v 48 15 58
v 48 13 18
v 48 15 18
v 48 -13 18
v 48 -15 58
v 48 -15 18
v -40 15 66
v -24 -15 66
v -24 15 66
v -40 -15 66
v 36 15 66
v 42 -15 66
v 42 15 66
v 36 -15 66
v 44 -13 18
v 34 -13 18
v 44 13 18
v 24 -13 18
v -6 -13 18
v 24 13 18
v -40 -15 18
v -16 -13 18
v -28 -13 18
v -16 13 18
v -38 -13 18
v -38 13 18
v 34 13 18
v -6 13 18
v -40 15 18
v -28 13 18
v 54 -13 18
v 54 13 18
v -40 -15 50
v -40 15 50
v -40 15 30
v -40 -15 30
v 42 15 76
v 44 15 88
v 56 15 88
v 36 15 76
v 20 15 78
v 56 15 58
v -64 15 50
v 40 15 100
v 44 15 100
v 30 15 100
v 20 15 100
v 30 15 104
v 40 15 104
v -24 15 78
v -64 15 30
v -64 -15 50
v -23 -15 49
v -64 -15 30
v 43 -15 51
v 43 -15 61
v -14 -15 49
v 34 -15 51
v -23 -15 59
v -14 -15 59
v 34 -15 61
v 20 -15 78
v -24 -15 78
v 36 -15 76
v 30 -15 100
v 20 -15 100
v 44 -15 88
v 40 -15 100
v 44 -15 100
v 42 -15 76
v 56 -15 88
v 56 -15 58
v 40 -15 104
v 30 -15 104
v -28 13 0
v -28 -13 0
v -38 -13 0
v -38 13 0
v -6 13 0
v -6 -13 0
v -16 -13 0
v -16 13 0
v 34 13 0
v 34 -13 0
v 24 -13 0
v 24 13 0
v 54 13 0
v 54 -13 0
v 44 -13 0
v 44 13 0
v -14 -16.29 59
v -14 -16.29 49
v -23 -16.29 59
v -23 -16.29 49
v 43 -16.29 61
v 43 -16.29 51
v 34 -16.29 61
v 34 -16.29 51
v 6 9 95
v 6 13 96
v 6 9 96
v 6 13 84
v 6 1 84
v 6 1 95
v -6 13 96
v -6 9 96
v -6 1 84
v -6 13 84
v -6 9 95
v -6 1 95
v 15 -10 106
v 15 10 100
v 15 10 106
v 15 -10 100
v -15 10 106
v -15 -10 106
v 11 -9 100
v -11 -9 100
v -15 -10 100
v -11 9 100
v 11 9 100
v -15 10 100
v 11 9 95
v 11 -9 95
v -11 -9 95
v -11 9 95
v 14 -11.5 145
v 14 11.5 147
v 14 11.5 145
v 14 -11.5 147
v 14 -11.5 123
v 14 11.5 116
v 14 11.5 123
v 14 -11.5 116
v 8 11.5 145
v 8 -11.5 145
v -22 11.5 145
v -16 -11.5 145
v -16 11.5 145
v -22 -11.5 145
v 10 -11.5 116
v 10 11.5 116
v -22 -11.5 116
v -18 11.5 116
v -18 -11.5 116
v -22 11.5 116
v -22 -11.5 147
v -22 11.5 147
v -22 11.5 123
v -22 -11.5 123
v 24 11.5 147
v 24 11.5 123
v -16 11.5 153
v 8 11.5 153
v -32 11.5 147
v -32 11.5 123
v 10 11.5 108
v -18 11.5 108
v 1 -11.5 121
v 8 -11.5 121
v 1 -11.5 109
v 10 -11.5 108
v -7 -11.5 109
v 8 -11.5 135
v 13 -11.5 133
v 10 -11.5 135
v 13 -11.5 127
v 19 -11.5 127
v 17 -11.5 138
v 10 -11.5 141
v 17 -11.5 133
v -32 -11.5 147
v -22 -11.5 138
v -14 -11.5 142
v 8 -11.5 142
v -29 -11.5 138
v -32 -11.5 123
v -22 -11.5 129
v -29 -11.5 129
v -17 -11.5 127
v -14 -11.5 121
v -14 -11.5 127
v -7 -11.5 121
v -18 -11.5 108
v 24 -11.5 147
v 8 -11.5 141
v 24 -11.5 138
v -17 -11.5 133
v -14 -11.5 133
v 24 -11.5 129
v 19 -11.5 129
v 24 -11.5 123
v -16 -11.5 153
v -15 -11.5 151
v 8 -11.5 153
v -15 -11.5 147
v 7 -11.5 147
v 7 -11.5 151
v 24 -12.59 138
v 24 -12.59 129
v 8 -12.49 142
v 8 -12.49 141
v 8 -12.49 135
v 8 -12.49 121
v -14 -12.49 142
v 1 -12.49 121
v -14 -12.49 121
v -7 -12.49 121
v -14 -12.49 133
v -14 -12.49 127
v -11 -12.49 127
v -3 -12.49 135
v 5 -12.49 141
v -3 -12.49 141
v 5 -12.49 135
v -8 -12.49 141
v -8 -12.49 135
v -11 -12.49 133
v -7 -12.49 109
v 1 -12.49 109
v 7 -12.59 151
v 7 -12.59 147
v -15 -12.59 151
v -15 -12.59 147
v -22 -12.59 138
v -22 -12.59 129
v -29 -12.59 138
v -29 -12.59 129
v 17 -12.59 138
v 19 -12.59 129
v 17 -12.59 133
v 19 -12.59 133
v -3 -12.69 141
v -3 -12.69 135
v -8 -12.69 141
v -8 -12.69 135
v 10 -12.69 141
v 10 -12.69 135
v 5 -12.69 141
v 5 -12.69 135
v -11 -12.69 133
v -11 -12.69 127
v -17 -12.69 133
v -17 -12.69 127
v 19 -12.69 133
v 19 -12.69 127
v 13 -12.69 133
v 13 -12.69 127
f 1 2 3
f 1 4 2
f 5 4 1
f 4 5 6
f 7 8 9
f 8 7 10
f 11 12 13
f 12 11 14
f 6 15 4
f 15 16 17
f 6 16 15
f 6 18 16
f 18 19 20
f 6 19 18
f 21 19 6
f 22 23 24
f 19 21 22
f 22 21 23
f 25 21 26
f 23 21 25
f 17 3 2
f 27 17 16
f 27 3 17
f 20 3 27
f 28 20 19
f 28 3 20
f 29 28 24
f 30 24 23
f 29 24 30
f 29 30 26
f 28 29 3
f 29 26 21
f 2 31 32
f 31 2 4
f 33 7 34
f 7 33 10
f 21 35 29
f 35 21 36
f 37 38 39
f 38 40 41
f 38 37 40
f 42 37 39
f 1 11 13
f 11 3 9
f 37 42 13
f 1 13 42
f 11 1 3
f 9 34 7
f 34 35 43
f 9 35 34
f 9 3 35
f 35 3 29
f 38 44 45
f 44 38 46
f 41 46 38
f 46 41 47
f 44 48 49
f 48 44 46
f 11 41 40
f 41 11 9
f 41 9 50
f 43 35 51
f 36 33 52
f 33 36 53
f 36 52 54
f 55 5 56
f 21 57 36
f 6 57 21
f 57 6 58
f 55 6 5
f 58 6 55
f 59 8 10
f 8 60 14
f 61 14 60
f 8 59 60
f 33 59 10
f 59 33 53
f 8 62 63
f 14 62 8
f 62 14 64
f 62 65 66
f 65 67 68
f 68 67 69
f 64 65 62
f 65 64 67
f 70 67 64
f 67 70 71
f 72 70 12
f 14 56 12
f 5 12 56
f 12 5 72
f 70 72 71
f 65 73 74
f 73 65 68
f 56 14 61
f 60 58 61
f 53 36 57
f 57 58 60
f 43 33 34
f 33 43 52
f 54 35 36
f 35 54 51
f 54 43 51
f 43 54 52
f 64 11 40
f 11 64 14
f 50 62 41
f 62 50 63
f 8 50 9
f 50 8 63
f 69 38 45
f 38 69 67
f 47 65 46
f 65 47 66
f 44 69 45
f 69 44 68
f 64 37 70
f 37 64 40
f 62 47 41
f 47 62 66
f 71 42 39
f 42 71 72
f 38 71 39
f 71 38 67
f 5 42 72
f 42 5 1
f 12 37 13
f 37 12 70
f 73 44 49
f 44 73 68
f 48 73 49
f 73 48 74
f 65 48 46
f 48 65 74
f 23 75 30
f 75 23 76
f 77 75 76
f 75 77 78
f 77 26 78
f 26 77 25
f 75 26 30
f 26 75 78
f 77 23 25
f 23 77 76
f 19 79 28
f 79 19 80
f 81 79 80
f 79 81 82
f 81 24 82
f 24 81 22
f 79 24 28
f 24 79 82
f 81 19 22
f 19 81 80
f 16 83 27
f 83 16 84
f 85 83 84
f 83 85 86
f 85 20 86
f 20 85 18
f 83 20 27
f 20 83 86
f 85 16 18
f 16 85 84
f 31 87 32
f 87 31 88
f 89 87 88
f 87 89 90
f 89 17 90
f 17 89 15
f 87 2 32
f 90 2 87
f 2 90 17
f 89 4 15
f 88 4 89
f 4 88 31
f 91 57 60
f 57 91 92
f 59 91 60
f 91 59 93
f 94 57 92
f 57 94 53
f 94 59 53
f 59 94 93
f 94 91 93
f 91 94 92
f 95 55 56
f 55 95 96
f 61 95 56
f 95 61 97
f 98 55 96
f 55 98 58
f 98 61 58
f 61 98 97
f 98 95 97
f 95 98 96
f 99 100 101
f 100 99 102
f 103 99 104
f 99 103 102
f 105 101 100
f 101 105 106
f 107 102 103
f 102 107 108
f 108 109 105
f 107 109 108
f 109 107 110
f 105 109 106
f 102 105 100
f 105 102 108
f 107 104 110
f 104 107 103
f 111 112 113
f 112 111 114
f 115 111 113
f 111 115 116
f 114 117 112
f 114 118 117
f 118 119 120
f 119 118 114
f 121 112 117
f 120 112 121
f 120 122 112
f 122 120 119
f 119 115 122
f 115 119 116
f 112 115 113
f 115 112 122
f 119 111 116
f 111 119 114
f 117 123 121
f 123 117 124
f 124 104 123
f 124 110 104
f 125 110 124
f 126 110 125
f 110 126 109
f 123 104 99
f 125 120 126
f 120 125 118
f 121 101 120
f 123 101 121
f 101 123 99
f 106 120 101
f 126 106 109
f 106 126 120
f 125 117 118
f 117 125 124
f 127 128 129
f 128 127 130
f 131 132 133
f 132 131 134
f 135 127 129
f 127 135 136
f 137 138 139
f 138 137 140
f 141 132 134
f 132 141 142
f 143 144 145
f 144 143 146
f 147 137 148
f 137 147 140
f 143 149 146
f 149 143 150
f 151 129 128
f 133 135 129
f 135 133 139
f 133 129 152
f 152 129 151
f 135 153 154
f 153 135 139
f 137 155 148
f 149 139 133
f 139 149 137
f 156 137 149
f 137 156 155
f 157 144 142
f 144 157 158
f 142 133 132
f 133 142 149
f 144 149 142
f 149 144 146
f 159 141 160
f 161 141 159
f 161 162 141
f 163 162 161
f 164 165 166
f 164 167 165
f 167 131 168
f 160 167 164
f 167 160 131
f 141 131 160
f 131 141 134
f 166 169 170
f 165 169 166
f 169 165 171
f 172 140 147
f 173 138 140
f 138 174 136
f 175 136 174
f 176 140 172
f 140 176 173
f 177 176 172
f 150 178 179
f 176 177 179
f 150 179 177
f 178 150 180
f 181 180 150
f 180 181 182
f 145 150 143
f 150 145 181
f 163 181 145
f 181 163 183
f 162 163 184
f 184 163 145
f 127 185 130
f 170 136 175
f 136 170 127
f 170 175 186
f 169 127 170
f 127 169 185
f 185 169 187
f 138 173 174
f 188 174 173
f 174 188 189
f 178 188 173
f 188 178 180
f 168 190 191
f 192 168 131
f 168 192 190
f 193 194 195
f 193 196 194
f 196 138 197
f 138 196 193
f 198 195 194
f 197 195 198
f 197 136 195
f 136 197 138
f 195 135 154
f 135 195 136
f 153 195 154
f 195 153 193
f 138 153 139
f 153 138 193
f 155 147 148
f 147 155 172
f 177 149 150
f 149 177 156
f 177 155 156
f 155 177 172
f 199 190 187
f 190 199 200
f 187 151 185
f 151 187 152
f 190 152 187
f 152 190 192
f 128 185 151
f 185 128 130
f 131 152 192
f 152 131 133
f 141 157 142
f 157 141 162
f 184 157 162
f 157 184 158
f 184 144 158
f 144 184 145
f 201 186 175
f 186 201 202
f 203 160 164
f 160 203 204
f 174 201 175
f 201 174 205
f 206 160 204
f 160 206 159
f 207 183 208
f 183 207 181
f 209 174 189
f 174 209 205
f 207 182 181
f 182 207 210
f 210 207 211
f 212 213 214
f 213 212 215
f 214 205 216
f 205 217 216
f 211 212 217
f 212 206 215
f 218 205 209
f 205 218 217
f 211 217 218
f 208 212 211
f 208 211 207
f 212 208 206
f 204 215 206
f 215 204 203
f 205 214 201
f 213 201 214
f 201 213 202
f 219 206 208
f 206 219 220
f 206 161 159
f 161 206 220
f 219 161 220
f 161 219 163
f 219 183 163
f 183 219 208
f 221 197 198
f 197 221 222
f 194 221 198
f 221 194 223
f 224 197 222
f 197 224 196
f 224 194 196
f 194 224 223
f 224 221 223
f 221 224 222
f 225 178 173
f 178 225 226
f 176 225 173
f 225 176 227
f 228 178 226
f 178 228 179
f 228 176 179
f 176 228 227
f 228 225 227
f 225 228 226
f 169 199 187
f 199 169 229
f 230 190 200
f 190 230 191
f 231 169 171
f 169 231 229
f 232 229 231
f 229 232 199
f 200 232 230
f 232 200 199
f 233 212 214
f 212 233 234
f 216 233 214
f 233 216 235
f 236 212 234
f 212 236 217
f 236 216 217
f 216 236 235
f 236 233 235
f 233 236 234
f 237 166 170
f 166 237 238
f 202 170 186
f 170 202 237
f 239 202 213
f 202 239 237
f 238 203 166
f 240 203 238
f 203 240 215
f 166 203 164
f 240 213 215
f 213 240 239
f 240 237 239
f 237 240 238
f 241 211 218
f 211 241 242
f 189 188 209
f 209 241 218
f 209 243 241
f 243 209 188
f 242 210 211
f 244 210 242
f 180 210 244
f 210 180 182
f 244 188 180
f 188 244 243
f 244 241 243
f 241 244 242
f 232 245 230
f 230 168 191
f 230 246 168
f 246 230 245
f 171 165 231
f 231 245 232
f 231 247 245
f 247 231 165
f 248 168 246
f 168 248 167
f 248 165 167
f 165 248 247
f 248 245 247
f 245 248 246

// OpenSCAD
// Lightbulb Marker - Version 006
// Chunky 3D voxel model; the reference's white sticker outline is not geometry.
// Changes from previous version:
// - Widened/lowered the orange creature body for a closer front silhouette.
// - Enlarged the left protruding block and cleaned up the right-side step.
// - Moved the black square eyes higher and closer to the reference placement.
// - Shortened the bulb support so the light sits closer to the body.

eps = 0.01;
$fn = 32;

body_depth = 30;
leg_depth = 26;
post_depth = 12;
bulb_depth = 23;
detail_raise = 1.1;

orange = [0.84, 0.40, 0.26];
black = [0.02, 0.02, 0.02];
bulb_yellow = [1.00, 0.82, 0.38];
bulb_light = [1.00, 0.90, 0.58];
bulb_orange = [0.93, 0.54, 0.20];
bulb_red = [0.70, 0.22, 0.18];
base_gray = [0.60, 0.60, 0.55];
base_dark = [0.38, 0.39, 0.36];

// Rectangles are [x, z, width, height] in the front silhouette.
body_core = [
    [-40, 18, 88, 48],   // broader main body mass
    [-64, 30, 24, 20],   // larger left block protrusion
    [-24, 62, 60, 16],   // low stepped upper back
    [20, 76, 24, 24],    // shorter right shoulder
    [42, 58, 14, 30],    // clean right face block
    [30, 96, 10, 8]      // small top step
];

leg_blocks = [
    [-38, 0, 10, 18],
    [-16, 0, 10, 18],
    [24, 0, 10, 18],
    [44, 0, 10, 18]
];

eye_blocks = [
    [-23, 49, 9, 10],
    [34, 51, 9, 10]
];

socket_blocks = [
    [-15, 100, 30, 6],
    [-11, 95, 22, 5]
];

// A short centered support keeps the bulb printable without becoming a chimney.
rear_post = [-6, 84, 12, 0, post_depth, 12];

bulb_blocks = [
    [-22, 116, 36, 29],  // central bulb body
    [-16, 145, 24, 8],   // flatter top cap
    [-32, 123, 10, 24],  // left side lobe
    [14, 123, 10, 24],   // right side lobe
    [-18, 108, 28, 9]    // lower bulb neck
];

bulb_light_blocks = [
    [-14, 121, 22, 21],
    [-7, 109, 8, 12]
];

bulb_orange_blocks = [
    [-15, 147, 22, 4],
    [-29, 129, 7, 9],
    [17, 129, 7, 9]
];

bulb_red_blocks = [
    [-8, 135, 5, 6],
    [5, 135, 5, 6],
    [-17, 127, 6, 6],
    [13, 127, 6, 6]
];

module block3d(x, z, w, d, h, col, y = 0) {
    color(col)
        translate([x, y - d / 2, z])
            cube([w, d, h]);
}

module blocks3d(rects, d, col) {
    union() {
        for (r = rects)
            block3d(r[0], r[1], r[2], d, r[3], col);
    }
}

module front_detail(x, z, w, h, base_depth, col, raise = detail_raise) {
    color(col)
        translate([x, -base_depth / 2 - raise + eps, z])
            cube([w, raise, h]);
}

module front_details(rects, base_depth, col, raise = detail_raise) {
    union() {
        for (r = rects)
            front_detail(r[0], r[1], r[2], r[3], base_depth, col, raise);
    }
}

module orange_body() {
    union() {
        blocks3d(body_core, body_depth, orange);
        blocks3d(leg_blocks, leg_depth, orange);
        block3d(rear_post[0], rear_post[1], rear_post[2], rear_post[4], rear_post[5], orange, 7);
        front_details(eye_blocks, body_depth, black, 1.3);
    }
}

module socket() {
    union() {
        block3d(socket_blocks[0][0], socket_blocks[0][1], socket_blocks[0][2], 20, socket_blocks[0][3], base_gray);
        block3d(socket_blocks[1][0], socket_blocks[1][1], socket_blocks[1][2], 18, socket_blocks[1][3], base_dark);
    }
}

module chunky_bulb() {
    union() {
        blocks3d(bulb_blocks, bulb_depth, bulb_yellow);
        front_details(bulb_light_blocks, bulb_depth, bulb_light, 1.0);
        front_details(bulb_orange_blocks, bulb_depth, bulb_orange, 1.1);
        front_details(bulb_red_blocks, bulb_depth, bulb_red, 1.2);
    }
}

module model() {
    union() {
        orange_body();
        socket();
        chunky_bulb();
    }
}

model();
